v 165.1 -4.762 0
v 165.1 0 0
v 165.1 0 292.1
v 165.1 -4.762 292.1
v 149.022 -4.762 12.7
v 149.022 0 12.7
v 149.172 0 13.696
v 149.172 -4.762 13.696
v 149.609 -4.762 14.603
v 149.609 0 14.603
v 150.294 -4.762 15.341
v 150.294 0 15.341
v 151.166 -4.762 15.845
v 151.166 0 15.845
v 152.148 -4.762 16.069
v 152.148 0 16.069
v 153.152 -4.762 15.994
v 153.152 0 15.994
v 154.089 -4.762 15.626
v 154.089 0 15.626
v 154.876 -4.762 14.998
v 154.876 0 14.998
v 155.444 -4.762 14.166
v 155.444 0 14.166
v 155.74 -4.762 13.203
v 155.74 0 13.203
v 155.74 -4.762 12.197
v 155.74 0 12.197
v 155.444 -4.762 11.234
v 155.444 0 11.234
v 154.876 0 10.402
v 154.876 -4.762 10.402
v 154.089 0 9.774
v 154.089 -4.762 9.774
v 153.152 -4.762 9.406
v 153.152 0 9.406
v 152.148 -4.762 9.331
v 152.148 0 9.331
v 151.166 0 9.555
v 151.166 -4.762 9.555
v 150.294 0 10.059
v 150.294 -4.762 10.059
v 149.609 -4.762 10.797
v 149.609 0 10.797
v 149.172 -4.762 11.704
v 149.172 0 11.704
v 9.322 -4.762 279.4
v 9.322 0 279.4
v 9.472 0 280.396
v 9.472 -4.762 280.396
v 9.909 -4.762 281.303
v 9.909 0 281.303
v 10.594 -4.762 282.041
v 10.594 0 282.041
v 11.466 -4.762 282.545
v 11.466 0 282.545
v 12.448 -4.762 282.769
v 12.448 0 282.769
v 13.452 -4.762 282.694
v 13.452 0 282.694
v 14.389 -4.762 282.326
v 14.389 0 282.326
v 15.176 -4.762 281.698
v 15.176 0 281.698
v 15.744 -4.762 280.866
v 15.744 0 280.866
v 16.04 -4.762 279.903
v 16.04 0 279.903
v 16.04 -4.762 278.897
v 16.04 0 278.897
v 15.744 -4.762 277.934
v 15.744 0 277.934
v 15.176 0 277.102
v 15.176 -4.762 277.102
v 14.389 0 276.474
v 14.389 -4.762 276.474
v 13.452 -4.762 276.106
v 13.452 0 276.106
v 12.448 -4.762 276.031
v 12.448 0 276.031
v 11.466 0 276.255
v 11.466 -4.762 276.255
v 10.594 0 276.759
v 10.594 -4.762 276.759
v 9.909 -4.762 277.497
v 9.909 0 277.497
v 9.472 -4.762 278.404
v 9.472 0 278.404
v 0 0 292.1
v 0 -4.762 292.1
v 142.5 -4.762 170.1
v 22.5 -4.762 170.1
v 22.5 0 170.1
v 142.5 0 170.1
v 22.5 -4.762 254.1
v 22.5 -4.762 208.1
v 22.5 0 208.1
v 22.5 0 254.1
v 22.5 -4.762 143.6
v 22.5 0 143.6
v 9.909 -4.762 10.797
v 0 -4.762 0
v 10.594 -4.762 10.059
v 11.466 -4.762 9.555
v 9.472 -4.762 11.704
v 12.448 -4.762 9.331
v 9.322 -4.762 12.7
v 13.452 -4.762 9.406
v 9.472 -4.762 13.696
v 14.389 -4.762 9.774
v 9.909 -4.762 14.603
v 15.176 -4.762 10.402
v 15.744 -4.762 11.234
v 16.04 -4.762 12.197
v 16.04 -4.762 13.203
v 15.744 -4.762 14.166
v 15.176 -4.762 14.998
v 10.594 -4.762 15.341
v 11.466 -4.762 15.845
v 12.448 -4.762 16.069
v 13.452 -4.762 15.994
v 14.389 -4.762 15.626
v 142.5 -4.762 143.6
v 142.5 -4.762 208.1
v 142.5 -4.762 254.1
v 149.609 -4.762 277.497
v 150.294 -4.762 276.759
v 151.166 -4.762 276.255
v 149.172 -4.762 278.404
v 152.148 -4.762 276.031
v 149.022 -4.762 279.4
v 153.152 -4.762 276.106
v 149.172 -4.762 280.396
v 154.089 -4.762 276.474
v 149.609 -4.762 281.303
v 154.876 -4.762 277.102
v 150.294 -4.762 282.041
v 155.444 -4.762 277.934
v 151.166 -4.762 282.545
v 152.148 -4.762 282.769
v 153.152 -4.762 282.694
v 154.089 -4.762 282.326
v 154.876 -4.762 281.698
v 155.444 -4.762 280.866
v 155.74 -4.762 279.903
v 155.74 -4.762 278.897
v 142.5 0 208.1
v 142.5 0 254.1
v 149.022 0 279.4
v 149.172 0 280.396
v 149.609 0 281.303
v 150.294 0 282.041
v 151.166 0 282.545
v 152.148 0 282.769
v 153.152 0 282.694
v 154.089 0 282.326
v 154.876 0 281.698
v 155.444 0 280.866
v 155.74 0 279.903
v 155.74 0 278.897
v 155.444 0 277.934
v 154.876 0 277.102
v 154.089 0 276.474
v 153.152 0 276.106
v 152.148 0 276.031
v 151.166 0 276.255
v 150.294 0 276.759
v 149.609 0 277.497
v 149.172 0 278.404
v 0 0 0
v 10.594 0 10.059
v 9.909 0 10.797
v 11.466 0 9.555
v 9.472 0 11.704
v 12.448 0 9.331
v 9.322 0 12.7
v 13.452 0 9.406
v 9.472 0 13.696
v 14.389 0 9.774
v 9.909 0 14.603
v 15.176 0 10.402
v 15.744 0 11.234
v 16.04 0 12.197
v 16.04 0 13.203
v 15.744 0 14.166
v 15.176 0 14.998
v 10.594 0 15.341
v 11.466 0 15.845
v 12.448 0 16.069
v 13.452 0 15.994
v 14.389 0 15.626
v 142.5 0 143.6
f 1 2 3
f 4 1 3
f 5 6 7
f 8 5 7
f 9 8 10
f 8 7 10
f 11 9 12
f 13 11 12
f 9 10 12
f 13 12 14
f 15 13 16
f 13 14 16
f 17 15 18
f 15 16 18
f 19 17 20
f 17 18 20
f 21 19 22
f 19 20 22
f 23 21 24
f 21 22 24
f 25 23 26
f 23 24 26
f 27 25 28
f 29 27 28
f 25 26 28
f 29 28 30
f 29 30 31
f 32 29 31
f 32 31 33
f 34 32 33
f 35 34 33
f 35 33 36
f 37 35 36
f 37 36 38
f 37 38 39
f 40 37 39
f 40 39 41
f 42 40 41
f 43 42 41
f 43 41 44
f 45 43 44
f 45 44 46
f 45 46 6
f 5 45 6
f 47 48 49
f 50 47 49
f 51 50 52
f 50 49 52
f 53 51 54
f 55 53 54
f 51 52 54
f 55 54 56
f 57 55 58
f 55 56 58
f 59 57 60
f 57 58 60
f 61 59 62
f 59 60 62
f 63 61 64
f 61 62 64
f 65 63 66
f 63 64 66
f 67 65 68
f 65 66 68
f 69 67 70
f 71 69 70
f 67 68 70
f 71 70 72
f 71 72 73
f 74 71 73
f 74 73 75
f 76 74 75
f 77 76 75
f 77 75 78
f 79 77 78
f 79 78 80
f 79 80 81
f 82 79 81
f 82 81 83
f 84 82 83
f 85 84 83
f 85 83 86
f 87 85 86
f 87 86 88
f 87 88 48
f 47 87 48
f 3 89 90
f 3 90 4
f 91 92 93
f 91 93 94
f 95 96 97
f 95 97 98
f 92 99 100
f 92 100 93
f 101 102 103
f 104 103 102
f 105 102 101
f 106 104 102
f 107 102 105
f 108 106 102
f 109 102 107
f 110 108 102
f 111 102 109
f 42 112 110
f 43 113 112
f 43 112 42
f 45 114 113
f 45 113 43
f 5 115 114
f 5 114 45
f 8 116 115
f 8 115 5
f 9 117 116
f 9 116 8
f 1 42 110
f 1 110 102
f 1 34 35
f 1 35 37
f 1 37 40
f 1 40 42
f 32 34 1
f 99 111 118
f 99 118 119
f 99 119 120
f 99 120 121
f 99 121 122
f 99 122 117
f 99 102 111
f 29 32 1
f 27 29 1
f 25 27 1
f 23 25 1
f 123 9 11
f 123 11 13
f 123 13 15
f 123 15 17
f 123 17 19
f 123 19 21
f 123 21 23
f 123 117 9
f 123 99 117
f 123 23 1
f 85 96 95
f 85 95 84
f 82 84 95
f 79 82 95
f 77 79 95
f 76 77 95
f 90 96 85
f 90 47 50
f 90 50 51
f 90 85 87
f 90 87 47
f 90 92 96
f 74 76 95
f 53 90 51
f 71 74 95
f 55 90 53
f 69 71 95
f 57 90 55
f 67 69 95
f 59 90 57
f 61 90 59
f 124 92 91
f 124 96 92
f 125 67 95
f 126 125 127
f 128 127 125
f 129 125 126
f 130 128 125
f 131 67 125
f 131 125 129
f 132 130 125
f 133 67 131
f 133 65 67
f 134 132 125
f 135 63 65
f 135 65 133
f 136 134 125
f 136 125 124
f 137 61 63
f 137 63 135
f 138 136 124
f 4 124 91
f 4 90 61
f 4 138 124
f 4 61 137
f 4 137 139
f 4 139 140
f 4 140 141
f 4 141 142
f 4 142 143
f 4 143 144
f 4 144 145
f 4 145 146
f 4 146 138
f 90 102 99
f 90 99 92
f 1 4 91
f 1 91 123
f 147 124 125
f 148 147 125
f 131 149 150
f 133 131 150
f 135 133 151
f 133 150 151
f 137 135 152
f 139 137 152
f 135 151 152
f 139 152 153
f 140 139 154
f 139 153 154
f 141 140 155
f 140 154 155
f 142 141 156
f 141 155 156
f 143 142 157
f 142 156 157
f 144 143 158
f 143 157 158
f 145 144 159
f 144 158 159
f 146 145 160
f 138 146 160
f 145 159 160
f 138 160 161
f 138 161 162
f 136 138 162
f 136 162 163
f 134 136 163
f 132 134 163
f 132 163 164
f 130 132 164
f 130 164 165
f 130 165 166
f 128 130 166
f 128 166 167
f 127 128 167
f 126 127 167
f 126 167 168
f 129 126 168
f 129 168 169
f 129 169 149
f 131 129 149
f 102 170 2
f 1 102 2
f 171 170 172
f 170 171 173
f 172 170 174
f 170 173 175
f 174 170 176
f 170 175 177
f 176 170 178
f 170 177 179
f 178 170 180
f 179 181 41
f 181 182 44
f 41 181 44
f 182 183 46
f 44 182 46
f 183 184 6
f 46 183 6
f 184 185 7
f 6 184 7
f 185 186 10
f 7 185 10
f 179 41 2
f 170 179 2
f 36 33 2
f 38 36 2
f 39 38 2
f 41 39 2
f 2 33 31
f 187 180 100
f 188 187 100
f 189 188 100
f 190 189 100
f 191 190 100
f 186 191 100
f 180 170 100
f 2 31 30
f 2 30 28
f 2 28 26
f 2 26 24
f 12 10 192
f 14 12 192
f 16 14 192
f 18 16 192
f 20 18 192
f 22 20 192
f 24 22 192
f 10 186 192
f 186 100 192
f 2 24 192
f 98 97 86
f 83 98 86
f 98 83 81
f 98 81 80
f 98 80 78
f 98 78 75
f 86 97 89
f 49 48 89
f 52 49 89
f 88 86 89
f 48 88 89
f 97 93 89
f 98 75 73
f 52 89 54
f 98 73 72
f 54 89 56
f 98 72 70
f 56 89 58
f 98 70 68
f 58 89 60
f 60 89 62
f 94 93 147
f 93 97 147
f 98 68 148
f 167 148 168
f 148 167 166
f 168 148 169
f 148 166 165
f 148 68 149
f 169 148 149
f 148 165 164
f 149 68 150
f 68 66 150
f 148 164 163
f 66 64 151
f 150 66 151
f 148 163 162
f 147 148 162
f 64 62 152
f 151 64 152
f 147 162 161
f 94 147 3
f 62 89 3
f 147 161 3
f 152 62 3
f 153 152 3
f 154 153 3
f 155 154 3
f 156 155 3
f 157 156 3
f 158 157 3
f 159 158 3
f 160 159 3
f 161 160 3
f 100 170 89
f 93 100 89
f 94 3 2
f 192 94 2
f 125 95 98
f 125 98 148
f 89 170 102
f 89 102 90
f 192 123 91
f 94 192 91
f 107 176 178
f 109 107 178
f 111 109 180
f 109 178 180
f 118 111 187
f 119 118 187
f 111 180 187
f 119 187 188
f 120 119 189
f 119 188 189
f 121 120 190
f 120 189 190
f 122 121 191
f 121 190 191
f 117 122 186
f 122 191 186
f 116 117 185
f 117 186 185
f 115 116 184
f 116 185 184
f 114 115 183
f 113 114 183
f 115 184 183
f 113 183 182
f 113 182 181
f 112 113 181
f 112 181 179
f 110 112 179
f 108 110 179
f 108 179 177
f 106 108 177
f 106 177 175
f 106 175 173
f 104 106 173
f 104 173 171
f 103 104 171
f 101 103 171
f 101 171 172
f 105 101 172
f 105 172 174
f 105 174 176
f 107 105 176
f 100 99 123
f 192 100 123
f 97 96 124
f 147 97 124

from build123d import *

# Parameters (mm, degrees)
F0_W     = 165.1
F0_H     = 292.1
F1_DEPTH = 4.7625
F3_D     = 6.7564
F4_W     = 120
F4_H     = 46
F4_H_2   = 26.5
F5_DEPTH = 4.7635


with BuildPart() as f1:
    # F0 (on Front) → F1 (new body)
    with BuildSketch(Plane.XZ):
        with Locations((82.55, 146.05)):
            Rectangle(F0_W, F0_H)
    extrude(amount=F1_DEPTH)

    # F3 (through all)
    with Locations(Plane.XZ.offset(4.7625)):
        with Locations((12.7, 279.4), (152.4, 279.4), (12.7, 12.7), (152.4, 12.7)):
            Hole(F3_D / 2)

    # F4 (on face) → F5 (cut, through all)
    with BuildSketch(Plane.XZ.offset(4.7625)):
        with Locations((82.5, 231.1)):
            Rectangle(F4_W, F4_H)
        with Locations((82.5, 156.85)):
            Rectangle(F4_W, F4_H_2)
    extrude(amount=-F5_DEPTH, mode=Mode.SUBTRACT)


solid = f1.part
